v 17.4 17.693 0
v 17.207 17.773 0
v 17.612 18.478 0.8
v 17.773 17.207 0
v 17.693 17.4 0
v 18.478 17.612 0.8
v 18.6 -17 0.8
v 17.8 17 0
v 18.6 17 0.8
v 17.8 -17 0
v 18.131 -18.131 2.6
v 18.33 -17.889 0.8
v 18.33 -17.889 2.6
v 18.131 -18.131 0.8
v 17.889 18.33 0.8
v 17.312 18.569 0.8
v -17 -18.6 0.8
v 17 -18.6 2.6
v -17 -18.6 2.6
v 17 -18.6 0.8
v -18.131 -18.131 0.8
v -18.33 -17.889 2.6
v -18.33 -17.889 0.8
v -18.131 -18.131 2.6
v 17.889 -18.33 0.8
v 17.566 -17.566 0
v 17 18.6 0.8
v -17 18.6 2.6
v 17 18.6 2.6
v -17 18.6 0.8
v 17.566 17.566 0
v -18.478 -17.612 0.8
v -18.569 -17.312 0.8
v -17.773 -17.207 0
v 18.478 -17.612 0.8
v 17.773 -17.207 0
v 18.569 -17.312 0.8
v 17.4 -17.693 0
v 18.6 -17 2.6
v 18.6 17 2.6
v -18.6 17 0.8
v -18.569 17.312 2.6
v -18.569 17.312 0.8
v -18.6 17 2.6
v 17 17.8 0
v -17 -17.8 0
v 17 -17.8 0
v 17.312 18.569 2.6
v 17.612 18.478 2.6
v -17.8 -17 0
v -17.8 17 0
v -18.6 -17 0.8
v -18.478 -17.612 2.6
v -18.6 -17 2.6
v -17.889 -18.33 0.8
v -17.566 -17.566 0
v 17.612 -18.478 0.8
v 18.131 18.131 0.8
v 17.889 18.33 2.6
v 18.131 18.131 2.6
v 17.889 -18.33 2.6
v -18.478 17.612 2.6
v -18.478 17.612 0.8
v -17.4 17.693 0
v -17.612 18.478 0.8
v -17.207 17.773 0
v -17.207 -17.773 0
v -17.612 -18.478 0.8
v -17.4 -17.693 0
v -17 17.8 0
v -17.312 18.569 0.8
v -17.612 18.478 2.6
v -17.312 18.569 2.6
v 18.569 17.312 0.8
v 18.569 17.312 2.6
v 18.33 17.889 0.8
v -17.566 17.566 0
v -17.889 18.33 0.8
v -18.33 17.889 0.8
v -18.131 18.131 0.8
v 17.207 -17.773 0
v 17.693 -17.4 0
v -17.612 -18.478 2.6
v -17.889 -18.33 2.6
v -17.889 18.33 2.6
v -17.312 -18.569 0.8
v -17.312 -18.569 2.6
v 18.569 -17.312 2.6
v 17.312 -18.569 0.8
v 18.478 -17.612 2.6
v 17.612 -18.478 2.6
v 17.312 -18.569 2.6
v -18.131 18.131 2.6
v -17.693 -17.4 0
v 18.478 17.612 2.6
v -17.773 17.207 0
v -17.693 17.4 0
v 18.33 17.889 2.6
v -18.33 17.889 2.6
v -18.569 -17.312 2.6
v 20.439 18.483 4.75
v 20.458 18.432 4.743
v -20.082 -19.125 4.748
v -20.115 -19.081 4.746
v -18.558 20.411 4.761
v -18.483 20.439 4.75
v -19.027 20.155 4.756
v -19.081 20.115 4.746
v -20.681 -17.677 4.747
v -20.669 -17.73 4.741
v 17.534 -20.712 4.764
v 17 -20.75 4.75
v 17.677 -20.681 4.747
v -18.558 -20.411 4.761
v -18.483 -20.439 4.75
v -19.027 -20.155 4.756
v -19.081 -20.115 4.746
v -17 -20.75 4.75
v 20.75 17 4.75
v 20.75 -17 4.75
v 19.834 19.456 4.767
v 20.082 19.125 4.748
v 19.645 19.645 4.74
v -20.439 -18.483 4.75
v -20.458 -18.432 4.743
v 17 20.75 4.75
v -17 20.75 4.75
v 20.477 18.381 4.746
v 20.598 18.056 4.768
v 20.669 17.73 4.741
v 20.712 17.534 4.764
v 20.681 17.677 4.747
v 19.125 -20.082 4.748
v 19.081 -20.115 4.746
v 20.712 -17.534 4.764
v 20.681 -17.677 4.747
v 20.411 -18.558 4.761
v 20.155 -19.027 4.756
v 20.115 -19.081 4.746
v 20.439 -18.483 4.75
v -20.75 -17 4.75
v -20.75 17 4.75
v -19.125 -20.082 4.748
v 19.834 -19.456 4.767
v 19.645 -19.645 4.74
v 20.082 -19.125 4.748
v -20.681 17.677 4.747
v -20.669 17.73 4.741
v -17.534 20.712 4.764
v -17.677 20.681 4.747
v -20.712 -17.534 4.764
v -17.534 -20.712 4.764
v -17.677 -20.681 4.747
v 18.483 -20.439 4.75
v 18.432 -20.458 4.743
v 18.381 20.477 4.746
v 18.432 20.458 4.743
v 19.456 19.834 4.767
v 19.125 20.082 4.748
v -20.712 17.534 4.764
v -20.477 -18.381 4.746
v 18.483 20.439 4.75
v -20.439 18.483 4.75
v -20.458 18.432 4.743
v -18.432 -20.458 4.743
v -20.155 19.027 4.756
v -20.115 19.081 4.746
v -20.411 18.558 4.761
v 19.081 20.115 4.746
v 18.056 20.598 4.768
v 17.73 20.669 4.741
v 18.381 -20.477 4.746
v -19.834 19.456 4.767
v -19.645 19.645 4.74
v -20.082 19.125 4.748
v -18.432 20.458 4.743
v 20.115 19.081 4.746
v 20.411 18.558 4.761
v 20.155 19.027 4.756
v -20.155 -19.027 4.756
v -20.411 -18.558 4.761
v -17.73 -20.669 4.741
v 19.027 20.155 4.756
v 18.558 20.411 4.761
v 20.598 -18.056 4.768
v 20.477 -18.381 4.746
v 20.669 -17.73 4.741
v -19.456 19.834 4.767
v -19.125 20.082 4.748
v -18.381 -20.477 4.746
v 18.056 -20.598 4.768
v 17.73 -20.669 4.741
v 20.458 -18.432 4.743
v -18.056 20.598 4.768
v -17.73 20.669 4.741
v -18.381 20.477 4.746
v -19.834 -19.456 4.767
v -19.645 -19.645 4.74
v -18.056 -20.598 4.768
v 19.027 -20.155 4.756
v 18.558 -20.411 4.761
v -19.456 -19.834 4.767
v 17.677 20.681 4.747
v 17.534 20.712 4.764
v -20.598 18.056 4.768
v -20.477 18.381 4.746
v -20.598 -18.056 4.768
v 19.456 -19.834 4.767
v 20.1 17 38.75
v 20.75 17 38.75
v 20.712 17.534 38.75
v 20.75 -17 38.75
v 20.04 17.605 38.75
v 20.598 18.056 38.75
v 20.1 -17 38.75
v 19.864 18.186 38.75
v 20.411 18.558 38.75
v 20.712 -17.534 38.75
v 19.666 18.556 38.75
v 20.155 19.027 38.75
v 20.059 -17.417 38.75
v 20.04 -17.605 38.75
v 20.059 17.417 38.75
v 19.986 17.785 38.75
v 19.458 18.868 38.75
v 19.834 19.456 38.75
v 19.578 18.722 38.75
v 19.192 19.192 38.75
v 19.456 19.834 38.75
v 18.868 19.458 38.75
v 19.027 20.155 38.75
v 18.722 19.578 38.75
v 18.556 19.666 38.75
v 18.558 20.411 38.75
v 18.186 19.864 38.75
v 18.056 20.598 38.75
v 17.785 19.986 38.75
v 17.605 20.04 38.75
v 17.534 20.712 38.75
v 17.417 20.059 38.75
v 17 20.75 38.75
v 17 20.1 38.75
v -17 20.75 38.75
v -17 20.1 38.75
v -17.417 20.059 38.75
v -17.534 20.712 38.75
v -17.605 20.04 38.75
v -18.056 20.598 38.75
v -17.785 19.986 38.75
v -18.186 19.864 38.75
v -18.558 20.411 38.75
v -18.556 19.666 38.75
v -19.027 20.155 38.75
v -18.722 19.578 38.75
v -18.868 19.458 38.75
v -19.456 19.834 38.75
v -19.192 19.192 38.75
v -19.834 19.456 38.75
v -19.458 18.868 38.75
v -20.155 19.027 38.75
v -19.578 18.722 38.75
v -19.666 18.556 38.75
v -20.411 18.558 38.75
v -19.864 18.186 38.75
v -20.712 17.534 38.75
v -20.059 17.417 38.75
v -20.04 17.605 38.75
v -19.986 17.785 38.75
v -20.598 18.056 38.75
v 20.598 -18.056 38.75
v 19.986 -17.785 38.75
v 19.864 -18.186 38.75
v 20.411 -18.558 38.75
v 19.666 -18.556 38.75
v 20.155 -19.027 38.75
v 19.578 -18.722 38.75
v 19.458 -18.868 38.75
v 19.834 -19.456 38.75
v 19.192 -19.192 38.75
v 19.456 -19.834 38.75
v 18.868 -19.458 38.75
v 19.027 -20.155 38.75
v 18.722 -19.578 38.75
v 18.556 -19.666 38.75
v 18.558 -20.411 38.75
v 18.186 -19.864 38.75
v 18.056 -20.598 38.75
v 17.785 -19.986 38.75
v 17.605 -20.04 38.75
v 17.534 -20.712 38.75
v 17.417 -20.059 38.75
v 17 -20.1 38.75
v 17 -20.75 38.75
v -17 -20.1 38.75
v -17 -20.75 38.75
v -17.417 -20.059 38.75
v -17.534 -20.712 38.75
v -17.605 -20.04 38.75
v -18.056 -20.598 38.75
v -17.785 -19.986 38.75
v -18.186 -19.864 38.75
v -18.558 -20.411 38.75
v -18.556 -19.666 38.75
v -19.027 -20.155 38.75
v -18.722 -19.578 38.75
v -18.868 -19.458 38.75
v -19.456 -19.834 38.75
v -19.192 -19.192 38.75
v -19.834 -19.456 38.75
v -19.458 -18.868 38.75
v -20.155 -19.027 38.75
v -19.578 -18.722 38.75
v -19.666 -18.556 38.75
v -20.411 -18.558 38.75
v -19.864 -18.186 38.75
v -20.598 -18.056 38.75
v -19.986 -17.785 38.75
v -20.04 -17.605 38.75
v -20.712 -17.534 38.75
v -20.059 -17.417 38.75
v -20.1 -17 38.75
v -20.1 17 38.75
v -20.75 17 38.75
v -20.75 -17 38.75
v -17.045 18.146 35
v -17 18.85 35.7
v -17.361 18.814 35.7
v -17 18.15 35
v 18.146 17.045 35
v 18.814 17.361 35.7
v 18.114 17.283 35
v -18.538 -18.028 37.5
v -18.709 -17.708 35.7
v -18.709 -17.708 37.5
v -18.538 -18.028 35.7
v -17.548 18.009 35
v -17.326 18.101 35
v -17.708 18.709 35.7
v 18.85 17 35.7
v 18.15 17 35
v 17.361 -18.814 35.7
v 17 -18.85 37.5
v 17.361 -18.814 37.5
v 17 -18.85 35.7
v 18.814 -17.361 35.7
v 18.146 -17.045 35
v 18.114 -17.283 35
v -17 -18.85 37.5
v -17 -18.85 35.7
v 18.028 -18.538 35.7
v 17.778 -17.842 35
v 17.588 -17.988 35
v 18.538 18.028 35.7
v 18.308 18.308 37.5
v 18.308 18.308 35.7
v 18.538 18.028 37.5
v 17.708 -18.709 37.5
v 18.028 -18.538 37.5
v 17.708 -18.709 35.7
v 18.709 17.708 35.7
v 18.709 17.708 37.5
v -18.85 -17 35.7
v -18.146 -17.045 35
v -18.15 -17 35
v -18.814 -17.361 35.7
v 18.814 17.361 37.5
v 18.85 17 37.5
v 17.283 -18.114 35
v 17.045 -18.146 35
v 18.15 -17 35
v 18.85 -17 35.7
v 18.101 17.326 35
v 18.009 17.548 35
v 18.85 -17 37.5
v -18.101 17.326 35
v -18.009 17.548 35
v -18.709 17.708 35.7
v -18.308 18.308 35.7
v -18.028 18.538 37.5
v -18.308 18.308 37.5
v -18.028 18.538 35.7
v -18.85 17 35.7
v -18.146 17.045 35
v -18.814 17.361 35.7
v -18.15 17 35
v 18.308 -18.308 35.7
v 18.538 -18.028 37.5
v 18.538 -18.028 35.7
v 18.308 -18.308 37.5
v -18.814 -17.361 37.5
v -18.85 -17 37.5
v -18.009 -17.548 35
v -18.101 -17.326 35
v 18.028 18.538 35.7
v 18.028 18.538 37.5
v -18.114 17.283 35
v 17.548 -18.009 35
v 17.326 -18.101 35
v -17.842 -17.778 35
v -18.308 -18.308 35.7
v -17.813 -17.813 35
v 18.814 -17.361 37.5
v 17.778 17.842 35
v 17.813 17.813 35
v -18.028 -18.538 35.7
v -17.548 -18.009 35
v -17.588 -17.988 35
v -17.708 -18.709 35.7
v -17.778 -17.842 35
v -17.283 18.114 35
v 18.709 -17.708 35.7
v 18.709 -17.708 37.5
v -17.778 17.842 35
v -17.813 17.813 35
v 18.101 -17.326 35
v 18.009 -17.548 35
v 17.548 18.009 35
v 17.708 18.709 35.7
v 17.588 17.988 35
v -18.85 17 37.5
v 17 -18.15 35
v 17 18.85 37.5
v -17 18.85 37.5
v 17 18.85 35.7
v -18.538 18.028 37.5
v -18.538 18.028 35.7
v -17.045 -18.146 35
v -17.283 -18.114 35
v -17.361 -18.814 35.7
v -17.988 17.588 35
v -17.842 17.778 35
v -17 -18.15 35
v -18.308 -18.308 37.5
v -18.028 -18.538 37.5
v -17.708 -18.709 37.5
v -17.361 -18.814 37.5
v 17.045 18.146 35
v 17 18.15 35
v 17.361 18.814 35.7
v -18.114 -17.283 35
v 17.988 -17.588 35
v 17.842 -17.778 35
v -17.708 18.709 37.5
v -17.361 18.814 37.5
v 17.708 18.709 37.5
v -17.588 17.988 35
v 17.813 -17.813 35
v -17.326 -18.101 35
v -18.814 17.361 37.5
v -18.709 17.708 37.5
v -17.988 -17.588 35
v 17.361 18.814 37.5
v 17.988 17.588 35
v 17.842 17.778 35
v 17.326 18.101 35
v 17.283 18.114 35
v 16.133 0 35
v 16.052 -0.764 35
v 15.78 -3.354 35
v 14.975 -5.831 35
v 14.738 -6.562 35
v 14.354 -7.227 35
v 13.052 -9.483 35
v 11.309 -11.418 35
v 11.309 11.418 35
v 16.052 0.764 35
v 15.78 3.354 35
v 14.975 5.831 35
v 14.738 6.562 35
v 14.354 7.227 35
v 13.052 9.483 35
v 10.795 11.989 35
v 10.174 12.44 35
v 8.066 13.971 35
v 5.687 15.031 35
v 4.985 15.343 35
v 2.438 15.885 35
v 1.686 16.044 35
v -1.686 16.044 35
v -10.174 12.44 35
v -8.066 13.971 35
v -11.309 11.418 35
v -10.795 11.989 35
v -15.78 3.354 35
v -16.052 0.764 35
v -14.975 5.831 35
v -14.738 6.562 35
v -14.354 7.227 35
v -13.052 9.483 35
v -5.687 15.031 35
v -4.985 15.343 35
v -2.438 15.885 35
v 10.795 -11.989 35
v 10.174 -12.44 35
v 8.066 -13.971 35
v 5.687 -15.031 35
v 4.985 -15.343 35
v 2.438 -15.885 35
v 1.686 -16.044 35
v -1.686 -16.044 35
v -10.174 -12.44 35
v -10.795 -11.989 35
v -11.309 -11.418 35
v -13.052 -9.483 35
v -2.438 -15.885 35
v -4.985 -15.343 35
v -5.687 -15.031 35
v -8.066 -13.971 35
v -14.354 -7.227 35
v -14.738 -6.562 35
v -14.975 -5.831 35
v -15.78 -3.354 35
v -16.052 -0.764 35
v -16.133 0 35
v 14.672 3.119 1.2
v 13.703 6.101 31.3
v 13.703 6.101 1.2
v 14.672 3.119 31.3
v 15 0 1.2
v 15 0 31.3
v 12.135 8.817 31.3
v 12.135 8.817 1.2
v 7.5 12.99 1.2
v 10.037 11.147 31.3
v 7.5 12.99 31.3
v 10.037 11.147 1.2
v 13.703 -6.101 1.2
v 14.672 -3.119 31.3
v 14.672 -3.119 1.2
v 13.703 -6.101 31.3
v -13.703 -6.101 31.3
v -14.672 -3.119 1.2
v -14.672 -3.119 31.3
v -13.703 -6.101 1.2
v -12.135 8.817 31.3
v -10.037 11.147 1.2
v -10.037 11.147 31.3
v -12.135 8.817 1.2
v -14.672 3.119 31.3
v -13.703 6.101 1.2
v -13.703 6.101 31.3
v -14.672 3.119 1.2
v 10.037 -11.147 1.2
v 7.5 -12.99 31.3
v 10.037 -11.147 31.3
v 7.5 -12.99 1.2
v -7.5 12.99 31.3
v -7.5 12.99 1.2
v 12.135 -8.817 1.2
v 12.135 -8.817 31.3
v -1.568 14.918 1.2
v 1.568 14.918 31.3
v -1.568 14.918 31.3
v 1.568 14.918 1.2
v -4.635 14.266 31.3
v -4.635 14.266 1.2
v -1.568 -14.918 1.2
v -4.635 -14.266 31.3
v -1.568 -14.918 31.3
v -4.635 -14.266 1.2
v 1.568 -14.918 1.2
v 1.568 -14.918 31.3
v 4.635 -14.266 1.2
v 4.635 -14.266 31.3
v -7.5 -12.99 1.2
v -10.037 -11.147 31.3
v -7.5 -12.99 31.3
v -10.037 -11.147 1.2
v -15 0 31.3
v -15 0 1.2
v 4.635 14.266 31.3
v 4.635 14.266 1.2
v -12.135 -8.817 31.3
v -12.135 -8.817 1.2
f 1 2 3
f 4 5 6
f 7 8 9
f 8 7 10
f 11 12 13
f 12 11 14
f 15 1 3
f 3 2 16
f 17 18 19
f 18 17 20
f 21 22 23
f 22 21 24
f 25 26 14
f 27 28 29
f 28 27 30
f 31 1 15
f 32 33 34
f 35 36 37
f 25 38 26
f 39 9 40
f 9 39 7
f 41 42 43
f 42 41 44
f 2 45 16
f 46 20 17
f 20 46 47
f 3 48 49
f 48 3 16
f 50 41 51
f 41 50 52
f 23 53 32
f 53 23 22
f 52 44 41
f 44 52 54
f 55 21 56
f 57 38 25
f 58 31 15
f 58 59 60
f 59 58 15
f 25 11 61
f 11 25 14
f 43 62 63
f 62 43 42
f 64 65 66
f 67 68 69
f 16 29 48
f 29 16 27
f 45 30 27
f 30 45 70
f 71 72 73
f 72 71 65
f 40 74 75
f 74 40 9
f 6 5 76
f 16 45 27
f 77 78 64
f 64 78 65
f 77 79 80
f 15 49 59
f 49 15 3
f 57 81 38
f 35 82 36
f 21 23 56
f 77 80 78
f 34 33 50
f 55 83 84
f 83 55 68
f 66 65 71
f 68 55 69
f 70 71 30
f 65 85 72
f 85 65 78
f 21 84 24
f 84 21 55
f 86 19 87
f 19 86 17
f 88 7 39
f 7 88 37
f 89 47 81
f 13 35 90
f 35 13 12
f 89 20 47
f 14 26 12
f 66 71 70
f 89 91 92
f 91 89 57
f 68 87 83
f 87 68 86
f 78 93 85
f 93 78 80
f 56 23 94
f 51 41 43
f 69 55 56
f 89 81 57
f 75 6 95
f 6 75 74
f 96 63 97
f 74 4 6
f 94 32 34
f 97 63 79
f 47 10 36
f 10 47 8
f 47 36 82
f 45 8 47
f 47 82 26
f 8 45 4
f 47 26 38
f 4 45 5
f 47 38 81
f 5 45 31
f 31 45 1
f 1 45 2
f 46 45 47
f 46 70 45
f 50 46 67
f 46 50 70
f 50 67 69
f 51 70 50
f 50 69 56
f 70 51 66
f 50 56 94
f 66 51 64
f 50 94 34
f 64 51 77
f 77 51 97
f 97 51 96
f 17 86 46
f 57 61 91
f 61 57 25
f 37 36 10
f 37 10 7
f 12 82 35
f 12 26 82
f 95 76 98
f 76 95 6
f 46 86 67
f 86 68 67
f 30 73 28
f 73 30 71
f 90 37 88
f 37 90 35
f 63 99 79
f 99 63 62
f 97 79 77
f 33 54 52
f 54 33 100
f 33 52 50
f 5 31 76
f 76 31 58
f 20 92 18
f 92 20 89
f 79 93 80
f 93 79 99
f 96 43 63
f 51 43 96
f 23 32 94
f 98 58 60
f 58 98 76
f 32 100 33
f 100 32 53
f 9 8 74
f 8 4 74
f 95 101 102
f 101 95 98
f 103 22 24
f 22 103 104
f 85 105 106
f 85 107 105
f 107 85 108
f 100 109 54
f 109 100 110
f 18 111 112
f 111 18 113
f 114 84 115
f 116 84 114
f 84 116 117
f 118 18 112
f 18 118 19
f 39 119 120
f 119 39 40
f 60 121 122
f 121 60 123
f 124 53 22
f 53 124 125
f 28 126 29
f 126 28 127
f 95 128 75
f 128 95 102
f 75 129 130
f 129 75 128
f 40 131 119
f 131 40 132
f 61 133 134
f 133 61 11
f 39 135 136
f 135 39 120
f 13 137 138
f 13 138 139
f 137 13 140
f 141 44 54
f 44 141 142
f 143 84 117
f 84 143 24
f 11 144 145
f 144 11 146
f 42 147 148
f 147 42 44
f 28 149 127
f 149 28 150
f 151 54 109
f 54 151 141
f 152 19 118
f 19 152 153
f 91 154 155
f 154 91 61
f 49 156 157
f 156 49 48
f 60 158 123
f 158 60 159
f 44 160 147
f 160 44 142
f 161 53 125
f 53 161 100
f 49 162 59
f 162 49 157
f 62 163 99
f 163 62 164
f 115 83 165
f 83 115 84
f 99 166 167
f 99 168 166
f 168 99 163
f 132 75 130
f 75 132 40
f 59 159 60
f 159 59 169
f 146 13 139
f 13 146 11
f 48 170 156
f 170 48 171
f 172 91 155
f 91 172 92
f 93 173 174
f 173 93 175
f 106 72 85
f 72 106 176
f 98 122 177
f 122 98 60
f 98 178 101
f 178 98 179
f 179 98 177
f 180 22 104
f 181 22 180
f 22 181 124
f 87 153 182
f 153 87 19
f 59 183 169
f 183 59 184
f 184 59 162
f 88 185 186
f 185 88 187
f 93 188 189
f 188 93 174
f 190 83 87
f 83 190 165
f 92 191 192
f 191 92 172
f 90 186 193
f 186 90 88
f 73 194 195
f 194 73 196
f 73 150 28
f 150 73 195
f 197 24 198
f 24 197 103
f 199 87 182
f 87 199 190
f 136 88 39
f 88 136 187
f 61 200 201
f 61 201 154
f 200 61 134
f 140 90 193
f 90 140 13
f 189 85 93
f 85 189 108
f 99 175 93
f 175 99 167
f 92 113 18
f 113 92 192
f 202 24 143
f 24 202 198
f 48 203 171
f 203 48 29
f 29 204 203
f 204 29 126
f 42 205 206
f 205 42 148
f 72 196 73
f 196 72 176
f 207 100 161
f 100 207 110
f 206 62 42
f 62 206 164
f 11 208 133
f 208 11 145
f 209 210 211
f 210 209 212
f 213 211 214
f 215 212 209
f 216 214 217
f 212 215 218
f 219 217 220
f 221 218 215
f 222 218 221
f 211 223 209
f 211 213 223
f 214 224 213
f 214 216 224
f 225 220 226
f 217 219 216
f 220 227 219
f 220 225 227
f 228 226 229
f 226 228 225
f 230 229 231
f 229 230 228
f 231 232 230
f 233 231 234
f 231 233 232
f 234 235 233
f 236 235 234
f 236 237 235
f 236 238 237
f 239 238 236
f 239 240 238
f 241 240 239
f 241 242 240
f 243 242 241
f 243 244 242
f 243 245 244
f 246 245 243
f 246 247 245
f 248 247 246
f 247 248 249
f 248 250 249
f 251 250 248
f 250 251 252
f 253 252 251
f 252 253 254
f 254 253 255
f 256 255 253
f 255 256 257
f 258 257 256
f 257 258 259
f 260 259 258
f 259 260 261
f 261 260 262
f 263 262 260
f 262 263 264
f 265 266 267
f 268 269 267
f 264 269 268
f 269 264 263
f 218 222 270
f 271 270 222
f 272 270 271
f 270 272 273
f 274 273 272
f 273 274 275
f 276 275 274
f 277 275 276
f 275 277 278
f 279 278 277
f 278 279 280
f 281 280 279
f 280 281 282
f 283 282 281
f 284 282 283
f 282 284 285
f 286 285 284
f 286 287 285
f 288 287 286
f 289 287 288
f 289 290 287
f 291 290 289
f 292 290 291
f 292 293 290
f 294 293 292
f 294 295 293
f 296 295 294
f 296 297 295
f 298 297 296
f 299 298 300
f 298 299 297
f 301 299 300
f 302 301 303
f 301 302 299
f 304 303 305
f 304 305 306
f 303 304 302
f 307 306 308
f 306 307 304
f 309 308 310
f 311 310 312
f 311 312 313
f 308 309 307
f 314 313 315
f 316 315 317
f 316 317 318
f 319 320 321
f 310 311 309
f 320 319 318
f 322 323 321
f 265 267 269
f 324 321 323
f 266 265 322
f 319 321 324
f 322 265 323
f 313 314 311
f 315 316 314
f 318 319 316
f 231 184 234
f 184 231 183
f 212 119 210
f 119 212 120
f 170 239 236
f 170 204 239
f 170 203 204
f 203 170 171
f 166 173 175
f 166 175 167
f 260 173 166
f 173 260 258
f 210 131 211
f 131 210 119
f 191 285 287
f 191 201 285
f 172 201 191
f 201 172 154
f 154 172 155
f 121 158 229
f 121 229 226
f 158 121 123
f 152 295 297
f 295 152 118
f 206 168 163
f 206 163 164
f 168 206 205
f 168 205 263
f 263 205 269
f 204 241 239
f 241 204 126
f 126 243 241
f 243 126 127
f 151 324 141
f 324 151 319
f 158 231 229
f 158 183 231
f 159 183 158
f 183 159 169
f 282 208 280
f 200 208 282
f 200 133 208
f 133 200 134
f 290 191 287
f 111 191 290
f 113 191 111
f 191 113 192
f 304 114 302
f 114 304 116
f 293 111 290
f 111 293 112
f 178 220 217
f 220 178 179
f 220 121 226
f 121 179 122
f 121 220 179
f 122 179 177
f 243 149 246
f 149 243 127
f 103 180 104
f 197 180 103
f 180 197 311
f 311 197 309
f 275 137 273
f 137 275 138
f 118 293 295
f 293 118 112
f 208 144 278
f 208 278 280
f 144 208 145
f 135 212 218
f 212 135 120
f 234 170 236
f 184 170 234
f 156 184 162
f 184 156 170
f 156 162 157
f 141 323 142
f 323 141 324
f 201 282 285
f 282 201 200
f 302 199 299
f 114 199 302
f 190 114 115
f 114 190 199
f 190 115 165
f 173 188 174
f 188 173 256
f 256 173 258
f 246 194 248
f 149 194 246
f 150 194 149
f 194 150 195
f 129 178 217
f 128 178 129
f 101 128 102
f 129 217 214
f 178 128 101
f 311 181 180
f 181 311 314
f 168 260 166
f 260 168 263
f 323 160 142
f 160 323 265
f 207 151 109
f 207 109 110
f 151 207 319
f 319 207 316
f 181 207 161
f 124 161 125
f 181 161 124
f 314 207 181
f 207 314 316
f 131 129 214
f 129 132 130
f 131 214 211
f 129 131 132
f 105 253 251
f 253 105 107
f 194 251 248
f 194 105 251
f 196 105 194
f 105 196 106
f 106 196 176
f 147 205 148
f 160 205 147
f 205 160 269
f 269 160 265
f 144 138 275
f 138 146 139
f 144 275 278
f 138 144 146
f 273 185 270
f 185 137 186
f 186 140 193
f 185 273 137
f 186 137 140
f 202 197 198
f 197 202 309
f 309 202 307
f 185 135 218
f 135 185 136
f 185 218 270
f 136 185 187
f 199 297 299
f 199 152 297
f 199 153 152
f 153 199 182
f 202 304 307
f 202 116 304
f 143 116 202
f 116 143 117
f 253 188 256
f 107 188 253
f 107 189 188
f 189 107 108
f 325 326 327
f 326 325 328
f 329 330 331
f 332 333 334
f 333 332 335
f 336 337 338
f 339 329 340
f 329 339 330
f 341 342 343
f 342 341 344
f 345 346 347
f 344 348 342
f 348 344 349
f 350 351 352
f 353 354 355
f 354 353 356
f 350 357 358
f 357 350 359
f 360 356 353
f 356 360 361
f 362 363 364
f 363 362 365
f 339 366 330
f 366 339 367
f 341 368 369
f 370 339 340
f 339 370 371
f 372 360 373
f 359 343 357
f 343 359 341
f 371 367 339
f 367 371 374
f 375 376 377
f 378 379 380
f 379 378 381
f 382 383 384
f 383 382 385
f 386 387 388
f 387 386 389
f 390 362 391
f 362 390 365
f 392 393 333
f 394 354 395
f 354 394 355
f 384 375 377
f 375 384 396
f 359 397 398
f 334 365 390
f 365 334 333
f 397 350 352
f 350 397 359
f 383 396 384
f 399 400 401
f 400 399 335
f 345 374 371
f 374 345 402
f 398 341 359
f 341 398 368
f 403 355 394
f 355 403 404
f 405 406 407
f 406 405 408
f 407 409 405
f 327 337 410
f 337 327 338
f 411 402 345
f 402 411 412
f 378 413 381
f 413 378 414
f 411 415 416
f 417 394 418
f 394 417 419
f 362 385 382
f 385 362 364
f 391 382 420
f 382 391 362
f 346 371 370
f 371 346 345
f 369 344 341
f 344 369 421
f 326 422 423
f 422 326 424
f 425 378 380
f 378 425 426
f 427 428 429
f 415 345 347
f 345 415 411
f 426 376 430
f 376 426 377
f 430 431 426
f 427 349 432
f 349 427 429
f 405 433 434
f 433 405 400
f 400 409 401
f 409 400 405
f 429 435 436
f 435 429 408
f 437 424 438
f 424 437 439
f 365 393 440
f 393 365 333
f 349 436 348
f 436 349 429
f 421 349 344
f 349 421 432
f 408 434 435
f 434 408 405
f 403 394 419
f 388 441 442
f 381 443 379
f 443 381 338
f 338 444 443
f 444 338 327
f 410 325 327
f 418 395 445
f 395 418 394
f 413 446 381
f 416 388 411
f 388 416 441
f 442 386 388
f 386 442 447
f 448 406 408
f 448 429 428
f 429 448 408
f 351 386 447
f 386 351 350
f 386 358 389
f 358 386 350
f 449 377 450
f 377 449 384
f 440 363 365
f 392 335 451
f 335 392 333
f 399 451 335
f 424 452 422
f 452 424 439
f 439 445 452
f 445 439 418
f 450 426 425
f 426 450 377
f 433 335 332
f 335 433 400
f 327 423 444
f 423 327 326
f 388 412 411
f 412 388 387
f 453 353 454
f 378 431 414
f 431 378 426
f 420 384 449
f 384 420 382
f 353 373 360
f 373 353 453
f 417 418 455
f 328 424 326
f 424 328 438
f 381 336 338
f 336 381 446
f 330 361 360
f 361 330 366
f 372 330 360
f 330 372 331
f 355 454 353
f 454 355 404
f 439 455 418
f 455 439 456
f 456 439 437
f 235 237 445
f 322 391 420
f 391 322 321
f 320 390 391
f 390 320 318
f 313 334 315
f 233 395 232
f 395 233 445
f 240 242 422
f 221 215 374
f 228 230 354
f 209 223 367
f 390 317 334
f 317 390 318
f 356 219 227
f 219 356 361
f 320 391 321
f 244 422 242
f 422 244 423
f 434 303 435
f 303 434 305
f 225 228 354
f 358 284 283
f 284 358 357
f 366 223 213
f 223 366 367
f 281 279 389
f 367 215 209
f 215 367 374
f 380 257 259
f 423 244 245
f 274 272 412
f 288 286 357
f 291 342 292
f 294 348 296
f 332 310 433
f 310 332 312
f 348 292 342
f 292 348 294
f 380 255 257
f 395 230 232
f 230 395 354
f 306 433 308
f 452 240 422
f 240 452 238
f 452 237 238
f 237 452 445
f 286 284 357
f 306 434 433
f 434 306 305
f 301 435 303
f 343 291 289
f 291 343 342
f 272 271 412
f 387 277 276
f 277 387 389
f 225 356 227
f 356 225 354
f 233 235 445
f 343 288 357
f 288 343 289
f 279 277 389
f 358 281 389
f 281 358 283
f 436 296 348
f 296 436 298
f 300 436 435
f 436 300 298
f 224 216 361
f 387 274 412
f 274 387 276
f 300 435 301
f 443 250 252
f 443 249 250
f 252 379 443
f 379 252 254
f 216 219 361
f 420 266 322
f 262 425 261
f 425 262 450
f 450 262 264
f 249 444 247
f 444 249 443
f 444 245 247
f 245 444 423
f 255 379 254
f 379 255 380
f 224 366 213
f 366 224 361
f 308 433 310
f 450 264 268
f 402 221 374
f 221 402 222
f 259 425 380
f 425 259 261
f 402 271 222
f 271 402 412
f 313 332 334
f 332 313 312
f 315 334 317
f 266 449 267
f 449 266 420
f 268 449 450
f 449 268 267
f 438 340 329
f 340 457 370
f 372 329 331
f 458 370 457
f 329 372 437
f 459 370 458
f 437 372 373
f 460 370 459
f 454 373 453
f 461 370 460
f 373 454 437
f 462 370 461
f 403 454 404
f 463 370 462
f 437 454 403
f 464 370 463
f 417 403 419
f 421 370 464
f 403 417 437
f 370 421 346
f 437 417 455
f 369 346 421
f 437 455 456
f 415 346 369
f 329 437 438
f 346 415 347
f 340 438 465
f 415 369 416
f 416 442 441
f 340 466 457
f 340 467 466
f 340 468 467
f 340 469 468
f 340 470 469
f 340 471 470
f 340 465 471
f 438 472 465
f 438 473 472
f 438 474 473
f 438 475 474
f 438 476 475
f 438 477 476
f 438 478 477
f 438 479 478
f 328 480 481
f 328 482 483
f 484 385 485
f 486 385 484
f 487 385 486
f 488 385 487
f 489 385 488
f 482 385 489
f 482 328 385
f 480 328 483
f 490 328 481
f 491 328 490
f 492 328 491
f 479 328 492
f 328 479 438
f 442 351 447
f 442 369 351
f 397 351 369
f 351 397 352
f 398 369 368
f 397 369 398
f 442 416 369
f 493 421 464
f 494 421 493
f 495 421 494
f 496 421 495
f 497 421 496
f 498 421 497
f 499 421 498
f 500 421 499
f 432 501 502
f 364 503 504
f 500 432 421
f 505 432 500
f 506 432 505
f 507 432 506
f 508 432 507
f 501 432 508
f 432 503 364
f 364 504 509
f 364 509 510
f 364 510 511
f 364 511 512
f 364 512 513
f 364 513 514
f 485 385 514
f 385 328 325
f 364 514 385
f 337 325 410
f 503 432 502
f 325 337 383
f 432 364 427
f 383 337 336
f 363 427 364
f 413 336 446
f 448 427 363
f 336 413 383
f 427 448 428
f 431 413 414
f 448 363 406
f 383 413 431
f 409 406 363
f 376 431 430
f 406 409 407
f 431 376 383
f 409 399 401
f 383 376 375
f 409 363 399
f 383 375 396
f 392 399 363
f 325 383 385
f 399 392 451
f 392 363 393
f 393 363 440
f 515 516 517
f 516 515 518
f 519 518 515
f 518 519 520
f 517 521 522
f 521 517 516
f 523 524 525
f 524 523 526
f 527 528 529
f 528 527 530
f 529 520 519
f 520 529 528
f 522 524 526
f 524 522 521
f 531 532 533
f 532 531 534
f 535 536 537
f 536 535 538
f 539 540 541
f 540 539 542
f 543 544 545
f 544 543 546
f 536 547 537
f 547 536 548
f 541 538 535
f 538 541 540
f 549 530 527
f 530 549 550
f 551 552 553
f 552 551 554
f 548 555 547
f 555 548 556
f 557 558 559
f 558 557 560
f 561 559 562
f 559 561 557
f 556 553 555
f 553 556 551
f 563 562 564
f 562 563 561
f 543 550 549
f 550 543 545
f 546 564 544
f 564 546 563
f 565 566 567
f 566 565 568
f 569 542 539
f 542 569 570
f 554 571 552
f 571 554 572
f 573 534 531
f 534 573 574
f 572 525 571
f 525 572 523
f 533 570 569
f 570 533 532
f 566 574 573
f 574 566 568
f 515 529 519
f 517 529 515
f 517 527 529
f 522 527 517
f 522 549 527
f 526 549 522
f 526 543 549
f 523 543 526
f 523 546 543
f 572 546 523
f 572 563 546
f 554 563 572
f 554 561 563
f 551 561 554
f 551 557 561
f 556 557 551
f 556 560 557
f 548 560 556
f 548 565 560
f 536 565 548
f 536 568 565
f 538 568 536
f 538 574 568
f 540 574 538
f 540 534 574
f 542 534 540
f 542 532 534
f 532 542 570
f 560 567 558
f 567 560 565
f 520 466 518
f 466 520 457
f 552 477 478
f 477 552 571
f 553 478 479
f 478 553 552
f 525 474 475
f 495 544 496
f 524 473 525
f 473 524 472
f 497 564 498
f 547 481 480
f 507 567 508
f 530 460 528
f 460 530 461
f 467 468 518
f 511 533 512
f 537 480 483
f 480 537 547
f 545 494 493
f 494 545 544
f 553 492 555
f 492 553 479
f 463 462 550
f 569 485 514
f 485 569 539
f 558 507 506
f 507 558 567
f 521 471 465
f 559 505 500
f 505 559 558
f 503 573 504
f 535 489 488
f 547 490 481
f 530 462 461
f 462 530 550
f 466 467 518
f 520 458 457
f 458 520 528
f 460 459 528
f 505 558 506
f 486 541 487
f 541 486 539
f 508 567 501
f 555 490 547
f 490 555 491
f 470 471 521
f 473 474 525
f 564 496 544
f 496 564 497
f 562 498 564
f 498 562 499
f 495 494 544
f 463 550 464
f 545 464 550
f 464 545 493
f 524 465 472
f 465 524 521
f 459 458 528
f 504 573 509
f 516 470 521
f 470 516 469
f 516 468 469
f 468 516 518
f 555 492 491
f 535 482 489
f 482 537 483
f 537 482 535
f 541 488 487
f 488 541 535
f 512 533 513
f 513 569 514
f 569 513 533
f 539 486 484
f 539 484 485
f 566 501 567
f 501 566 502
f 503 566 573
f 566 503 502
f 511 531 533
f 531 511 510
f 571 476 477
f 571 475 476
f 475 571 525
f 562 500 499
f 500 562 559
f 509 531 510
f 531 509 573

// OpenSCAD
// file: gridfinity_modules.scad
gridfinity_pitch = 42;
gridfinity_zpitch = 7;
gridfinity_clearance = 0.5;  // each bin is undersize by this much


// basic block with cutout in top to be stackable, optional holes in bottom
// start with this and begin 'carving'
module grid_block(num_x=1, num_y=1, num_z=2, bot_hole_depth=6, center=false) {
  corner_radius = 3.75;
  outer_size = gridfinity_pitch - gridfinity_clearance;  // typically 41.5
  block_corner_position = outer_size/2 - corner_radius;  // need not match center of pad corners
  
  totalht=gridfinity_zpitch*num_z+3.75;
  translate( center ? [-(num_x-1)*gridfinity_pitch/2, -(num_y-1)*gridfinity_pitch/2, 0] : [0, 0, 0] )
  difference() {
    intersection() {
      union() {
        // grid of pads
        gridcopy(num_x, num_y) pad_oversize();
        // main body will be cut down afterward
        translate([-gridfinity_pitch/2, -gridfinity_pitch/2, 5]) 
          cube([gridfinity_pitch*num_x, gridfinity_pitch*num_y, totalht-5]);
      }
      
      // crop with outer cylinders
      translate([0, 0, -0.1])
      hull() cornercopy(block_corner_position, num_x, num_y) 
        cylinder(r=corner_radius, h=totalht+0.2, $fn=44);
    }
    
    // remove top so XxY can fit on top
    translate([0, 0, gridfinity_zpitch*num_z]) pad_oversize(num_x, num_y, 1);
    
    // add holes in bottom pads if requested
    if (bot_hole_depth > 0) {
      gridcopy(num_x, num_y) bottomholes(bot_hole_depth);
    }
  }
}


// holes in the bottom of the pads (slightly short to allow deeper
module bottomholes(depth=6) {
  magnet_position = 13;
  magnet_od = 6.5;
  magnet_thickness = 2.4;
  eps = 0.1;  // differences are annoying with coincident faces
  if (depth > 0) {
    cornercopy(magnet_position) {
      translate([0, 0, -eps]) cylinder(d=magnet_od, h=magnet_thickness+eps, $fn=41);
      cylinder(d=3, h=depth, $fn=28);
    }
  }
}


// unit pad slightly oversize at the top to be trimmed or joined with other feet or the rest of the model
// also useful as cutouts for stacking
module pad_oversize(num_x=1, num_y=1, margins=0) {
  pad_corner_position = 17; // must be 17 to be compatible
  bevel1_top = 0.8;     // z of top of bottom-most bevel (bottom of bevel is at z=0)
  bevel2_bottom = 2.6;  // z of bottom of second bevel
  bevel2_top = 5;       // z of top of second bevel
  bonus_ht = 0.2;       // extra height (and radius) on second bevel
  
  // female parts are a bit oversize for a nicer fit
  radialgap = margins ? 0.25 : 0;  // oversize cylinders for a bit of clearance
  axialdown = margins ? 0.1 : 0;   // a tiny bit of axial clearance present in Zack's design
  
  translate([0, 0, -axialdown])
  difference() {
    union() {
      hull() cornercopy(pad_corner_position, num_x, num_y) {
        cylinder(d=1.6+2*radialgap, h=0.1, $fn=24);
        translate([0, 0, bevel1_top]) cylinder(d=3.2+2*radialgap, h=1.9, $fn=32);
      }
      
      hull() cornercopy(pad_corner_position, num_x, num_y) {
        translate([0, 0, bevel2_bottom]) 
        cylinder(d1=3.2+2*radialgap, d2=7.5+0.5+2*radialgap+2*bonus_ht, h=bevel2_top-bevel2_bottom+bonus_ht, $fn=32);
      }
    }
    
    // cut off bottom if we're going to go negative
    if (margins) {
      translate([-gridfinity_pitch/2, -gridfinity_pitch/2, 0])
      cube([gridfinity_pitch, gridfinity_pitch, axialdown]);
    }
  }
}


// similar to quadtranslate but expands to extremities of a block
module cornercopy(r, num_x=1, num_y=1) {
  for (xx=[-r, gridfinity_pitch*(num_x-1)+r]) for (yy=[-r, gridfinity_pitch*(num_y-1)+r]) 
    translate([xx, yy, 0]) children();
}


// make repeated copies of something(s) at the gridfinity spacing of 42mm
module gridcopy(num_x, num_y) {
  for (xi=[1:num_x]) for (yi=[1:num_y]) translate([gridfinity_pitch*(xi-1), gridfinity_pitch*(yi-1), 0]) children();
}
// main file
include <gridfinity_modules.scad>

cup_height = 5;
stick_diameter = 30;
easement_z = 0.7; // a slightly large opening at the top for compliance while inserting.
minimum_wall = 4;
blocks_needed = ceil((stick_diameter+2*minimum_wall)/gridfinity_pitch);

render()
glue_stick_cup(blocks_needed, blocks_needed, cup_height);


module glue_stick_cup(num_x=1, num_y=1, num_z=2, bottom_holes=0) {
  difference() {
    grid_block(num_x, num_y, num_z, bottom_holes ? 5 : 0, center=true);
    glue_stick(num_z, stick_diameter);
  }
}

module glue_stick(num_z=5, diam) {
  floor_thickness = blocks_needed > 1 ? 5.5 : 1.2;
  translate([0, 0, floor_thickness]) cylinder(h=num_z*gridfinity_zpitch, d=diam);
  translate([0, 0, (num_z - easement_z)*gridfinity_zpitch + 1.2]) 
    cylinder(h=easement_z*gridfinity_zpitch, d1=diam, d2=diam*1.1);
}
